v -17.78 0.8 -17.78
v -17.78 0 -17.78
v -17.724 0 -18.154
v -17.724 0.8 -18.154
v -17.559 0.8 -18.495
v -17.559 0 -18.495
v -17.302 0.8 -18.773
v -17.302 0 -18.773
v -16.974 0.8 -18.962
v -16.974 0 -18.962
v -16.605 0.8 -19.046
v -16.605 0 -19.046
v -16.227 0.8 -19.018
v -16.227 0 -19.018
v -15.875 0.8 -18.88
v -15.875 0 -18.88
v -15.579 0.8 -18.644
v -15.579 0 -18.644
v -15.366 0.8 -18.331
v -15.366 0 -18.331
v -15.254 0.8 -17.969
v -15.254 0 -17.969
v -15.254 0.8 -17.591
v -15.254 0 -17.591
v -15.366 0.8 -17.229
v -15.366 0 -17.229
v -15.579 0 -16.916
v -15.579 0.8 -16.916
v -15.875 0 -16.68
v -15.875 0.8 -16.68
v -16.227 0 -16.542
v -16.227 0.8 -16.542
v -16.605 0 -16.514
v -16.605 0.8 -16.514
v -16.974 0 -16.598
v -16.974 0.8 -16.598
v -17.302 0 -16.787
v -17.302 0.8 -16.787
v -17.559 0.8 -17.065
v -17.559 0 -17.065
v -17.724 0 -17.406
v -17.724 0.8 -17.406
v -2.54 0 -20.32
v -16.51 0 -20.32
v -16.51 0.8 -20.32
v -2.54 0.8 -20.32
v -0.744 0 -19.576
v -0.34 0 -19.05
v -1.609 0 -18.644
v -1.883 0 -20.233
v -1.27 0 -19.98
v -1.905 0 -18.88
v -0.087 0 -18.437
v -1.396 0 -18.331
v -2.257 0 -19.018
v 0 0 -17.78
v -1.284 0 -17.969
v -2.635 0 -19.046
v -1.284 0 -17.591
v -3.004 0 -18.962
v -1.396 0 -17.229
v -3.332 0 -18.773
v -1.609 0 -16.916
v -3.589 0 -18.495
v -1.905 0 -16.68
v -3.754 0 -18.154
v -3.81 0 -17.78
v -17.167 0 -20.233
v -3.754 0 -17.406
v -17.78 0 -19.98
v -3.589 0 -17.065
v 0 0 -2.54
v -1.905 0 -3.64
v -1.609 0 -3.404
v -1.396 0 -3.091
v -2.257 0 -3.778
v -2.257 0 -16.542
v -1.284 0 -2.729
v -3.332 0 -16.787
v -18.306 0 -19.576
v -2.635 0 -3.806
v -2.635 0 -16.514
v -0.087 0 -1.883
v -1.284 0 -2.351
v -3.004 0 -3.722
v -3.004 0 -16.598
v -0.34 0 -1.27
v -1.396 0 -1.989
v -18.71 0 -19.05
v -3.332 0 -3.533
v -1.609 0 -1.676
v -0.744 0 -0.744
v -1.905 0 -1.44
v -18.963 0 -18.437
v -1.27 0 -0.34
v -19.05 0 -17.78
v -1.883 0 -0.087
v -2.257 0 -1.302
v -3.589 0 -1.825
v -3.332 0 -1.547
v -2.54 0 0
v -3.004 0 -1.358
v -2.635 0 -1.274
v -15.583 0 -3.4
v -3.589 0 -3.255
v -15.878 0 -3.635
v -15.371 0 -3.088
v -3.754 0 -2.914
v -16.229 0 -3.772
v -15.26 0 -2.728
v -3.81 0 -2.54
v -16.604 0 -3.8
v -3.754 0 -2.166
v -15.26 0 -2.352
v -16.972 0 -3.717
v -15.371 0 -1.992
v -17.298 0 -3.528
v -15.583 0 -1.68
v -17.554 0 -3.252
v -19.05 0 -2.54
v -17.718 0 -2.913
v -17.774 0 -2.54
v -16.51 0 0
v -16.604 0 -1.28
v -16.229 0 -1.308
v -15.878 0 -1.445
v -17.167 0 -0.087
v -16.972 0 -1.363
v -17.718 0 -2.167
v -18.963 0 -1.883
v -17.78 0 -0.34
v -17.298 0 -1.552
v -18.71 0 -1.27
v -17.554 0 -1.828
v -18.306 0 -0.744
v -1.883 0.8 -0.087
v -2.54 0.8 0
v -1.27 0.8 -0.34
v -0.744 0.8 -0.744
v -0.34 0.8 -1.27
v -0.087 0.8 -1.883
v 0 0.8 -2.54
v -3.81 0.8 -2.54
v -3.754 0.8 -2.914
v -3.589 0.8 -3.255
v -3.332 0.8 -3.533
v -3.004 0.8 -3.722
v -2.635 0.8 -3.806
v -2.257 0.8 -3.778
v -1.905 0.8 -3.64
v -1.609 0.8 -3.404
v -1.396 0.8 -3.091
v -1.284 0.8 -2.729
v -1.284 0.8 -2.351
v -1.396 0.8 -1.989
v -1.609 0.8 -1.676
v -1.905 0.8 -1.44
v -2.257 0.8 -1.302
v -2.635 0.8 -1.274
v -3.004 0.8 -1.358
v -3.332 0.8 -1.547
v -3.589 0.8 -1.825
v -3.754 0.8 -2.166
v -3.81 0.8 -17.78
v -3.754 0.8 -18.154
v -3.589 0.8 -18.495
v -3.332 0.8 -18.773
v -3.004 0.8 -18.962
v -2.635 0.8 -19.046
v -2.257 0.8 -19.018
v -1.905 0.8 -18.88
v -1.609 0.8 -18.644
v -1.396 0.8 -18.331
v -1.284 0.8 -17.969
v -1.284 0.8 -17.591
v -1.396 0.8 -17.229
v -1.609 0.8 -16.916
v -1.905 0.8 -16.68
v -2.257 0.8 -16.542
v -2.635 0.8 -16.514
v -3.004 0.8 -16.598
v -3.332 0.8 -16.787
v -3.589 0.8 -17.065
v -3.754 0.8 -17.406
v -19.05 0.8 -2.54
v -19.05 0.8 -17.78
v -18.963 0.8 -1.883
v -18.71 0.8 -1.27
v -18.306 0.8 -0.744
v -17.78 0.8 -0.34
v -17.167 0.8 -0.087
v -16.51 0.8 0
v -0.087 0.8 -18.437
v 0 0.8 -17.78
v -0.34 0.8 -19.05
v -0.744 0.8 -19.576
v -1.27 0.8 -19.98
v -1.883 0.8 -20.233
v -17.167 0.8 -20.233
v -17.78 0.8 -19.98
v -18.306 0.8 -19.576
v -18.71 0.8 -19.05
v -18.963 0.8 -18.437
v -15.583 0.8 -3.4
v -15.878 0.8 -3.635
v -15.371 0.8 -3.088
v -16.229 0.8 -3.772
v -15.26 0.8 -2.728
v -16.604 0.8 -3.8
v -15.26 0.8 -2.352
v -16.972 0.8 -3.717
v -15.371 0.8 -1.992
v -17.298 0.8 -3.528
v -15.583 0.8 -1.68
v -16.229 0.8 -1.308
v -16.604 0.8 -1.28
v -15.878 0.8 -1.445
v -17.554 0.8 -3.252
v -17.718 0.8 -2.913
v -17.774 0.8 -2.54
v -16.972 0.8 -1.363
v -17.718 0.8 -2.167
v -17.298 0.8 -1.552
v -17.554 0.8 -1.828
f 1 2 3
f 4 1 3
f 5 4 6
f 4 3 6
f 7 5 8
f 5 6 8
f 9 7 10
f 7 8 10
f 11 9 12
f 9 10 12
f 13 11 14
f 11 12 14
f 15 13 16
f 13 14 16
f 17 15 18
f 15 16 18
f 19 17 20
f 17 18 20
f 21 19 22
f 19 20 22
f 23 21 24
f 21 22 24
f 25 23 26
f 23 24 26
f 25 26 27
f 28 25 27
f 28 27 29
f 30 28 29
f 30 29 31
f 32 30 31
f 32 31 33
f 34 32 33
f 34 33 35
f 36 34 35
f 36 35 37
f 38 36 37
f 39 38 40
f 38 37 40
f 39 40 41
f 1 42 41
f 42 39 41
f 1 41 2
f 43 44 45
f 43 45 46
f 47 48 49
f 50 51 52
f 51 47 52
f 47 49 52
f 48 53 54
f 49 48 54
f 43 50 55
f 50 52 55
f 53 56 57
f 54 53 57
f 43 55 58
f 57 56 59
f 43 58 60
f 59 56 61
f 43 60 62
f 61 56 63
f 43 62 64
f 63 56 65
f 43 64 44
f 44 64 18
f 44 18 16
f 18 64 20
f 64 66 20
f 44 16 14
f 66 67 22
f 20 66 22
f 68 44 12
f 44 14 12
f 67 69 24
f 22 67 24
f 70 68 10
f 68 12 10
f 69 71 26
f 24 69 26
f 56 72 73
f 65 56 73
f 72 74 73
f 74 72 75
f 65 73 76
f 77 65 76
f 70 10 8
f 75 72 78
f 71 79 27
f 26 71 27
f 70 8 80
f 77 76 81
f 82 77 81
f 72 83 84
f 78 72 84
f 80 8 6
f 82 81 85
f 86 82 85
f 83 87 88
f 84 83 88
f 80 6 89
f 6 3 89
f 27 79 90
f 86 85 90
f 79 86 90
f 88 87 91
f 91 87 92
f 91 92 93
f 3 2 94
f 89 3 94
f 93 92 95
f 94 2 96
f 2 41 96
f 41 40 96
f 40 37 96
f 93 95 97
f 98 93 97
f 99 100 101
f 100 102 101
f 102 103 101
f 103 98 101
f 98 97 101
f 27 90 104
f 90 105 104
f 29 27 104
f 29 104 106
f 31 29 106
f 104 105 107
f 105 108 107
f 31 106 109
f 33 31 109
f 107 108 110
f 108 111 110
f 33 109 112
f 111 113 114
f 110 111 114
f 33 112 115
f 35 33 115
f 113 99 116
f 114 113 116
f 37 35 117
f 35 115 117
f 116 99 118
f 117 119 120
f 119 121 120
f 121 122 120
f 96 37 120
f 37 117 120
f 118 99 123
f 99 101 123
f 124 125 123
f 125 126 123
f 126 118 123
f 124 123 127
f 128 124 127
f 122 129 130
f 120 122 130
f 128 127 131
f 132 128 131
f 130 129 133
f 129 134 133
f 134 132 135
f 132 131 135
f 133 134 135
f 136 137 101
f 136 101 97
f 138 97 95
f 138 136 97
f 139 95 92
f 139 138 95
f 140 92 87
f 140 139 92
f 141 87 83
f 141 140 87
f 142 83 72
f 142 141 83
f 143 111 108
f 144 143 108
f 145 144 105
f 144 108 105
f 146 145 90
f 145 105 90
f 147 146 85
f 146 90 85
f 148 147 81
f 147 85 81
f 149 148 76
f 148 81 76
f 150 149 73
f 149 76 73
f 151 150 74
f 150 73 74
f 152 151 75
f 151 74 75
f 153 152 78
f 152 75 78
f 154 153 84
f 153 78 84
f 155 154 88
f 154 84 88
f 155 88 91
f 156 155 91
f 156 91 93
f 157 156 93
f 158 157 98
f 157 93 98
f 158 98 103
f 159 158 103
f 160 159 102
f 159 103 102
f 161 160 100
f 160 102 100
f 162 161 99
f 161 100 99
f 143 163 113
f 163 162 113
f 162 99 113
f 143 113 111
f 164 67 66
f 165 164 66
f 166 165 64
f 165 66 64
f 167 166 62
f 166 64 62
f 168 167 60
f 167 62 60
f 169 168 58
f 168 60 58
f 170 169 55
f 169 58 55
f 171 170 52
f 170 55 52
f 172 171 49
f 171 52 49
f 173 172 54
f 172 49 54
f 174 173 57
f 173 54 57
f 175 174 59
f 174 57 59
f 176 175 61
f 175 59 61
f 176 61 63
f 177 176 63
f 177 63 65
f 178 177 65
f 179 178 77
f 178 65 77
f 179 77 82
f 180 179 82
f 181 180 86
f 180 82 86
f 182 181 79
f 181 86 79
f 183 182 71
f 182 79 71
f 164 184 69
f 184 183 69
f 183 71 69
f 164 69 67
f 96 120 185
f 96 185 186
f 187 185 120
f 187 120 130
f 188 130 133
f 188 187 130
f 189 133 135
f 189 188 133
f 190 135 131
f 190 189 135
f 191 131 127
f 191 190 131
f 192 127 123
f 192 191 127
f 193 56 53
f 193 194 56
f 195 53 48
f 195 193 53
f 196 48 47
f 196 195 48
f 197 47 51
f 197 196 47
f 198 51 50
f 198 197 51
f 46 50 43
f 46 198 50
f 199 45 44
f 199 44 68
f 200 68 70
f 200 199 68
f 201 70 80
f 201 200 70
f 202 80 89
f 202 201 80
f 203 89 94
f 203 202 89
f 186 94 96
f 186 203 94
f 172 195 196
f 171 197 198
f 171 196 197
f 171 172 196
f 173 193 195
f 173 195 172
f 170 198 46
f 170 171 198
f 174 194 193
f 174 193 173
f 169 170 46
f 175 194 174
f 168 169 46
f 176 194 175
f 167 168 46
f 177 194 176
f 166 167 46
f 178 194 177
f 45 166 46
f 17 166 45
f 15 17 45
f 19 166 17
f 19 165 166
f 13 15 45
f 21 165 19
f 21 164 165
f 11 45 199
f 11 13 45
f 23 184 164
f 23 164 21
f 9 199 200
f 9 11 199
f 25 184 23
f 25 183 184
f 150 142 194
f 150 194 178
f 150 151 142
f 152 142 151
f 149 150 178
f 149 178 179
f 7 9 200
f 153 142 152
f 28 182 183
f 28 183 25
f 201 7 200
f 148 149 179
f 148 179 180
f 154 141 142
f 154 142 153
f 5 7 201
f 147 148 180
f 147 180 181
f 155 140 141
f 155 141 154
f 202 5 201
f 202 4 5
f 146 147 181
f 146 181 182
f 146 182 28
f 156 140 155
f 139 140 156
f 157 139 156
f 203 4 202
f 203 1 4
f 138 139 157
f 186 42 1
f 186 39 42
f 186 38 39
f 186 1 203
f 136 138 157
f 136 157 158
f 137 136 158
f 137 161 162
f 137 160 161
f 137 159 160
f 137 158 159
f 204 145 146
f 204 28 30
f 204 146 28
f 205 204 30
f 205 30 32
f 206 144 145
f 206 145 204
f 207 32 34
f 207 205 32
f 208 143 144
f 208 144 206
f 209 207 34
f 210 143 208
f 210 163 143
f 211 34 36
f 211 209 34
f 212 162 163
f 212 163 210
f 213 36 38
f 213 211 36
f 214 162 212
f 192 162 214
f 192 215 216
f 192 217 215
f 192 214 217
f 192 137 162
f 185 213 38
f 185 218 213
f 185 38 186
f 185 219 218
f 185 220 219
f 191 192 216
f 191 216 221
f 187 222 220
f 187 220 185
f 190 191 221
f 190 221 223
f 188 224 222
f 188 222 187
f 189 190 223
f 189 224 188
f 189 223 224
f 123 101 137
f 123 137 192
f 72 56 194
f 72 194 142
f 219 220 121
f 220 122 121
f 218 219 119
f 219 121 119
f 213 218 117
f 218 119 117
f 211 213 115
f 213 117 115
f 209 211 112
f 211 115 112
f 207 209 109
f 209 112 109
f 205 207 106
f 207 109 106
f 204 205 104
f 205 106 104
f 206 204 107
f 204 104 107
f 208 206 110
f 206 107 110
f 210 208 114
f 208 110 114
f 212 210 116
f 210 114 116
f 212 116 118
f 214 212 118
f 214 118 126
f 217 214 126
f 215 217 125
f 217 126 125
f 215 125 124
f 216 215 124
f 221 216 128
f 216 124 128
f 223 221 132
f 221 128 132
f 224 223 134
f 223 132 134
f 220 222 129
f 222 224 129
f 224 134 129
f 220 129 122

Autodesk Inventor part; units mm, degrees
ref_plane "YZ Plane" through (0, 0, 0) normal (1, 0, 0) x (0, 1, 0)
ref_plane "XZ Plane" through (0, 0, 0) normal (0, 1, 0) x (-1, 0, 0)
ref_plane "XY Plane" through (0, 0, 0) normal (0, 0, 1) x (1, 0, 0)
sketch "Sketch1" plane through (0, 0, 0) normal (0, 1, 0) x (-1, 0, 0)
  line L0 (0, 0) -> (19.05, 0)
  line L1 (19.05, 0) -> (19.05, -20.32)
  line L2 (19.05, -20.32) -> (0, -20.32)
  line L3 (0, -20.32) -> (0, 0)
  circle A0 centre (16.51, -2.54) radius 1.2639
  circle A1 centre (16.51, -17.78) radius 1.27
  circle A2 centre (2.54, -17.78) radius 1.27
  circle A3 centre (2.54, -2.54) radius 1.27
  dimension "d0" = 20.32
  dimension "d1" = 19.05
  dimension "d2" = 15.24
  dimension "d3" = 2.54
  dimension "d4" = 15.24
  dimension "d5" = 13.97
  dimension "d6" = 2.54
  dimension "d7" = 13.97
  dimension "d8" = 2.54
  dimension "d9" = 2.54
  dimension "d10" = 2.54
  dimension "d11" = 2.54
  dimension "d12" = 2.54
  dimension "d13" = 2.54
extrude "Extrusion1" add sketch "Sketch1" along normal blind 0.8
fillet "Fillet1" radius 2.54 4 edges at (0, 0.4, 0) (0, 0.4, -20.32) (-19.05, 0.4, -20.32) (-19.05, 0.4, 0)
equation "\"d7\" = d5"
equation "\"d9\" = d8"
properties part number "micro lipo footprint"
